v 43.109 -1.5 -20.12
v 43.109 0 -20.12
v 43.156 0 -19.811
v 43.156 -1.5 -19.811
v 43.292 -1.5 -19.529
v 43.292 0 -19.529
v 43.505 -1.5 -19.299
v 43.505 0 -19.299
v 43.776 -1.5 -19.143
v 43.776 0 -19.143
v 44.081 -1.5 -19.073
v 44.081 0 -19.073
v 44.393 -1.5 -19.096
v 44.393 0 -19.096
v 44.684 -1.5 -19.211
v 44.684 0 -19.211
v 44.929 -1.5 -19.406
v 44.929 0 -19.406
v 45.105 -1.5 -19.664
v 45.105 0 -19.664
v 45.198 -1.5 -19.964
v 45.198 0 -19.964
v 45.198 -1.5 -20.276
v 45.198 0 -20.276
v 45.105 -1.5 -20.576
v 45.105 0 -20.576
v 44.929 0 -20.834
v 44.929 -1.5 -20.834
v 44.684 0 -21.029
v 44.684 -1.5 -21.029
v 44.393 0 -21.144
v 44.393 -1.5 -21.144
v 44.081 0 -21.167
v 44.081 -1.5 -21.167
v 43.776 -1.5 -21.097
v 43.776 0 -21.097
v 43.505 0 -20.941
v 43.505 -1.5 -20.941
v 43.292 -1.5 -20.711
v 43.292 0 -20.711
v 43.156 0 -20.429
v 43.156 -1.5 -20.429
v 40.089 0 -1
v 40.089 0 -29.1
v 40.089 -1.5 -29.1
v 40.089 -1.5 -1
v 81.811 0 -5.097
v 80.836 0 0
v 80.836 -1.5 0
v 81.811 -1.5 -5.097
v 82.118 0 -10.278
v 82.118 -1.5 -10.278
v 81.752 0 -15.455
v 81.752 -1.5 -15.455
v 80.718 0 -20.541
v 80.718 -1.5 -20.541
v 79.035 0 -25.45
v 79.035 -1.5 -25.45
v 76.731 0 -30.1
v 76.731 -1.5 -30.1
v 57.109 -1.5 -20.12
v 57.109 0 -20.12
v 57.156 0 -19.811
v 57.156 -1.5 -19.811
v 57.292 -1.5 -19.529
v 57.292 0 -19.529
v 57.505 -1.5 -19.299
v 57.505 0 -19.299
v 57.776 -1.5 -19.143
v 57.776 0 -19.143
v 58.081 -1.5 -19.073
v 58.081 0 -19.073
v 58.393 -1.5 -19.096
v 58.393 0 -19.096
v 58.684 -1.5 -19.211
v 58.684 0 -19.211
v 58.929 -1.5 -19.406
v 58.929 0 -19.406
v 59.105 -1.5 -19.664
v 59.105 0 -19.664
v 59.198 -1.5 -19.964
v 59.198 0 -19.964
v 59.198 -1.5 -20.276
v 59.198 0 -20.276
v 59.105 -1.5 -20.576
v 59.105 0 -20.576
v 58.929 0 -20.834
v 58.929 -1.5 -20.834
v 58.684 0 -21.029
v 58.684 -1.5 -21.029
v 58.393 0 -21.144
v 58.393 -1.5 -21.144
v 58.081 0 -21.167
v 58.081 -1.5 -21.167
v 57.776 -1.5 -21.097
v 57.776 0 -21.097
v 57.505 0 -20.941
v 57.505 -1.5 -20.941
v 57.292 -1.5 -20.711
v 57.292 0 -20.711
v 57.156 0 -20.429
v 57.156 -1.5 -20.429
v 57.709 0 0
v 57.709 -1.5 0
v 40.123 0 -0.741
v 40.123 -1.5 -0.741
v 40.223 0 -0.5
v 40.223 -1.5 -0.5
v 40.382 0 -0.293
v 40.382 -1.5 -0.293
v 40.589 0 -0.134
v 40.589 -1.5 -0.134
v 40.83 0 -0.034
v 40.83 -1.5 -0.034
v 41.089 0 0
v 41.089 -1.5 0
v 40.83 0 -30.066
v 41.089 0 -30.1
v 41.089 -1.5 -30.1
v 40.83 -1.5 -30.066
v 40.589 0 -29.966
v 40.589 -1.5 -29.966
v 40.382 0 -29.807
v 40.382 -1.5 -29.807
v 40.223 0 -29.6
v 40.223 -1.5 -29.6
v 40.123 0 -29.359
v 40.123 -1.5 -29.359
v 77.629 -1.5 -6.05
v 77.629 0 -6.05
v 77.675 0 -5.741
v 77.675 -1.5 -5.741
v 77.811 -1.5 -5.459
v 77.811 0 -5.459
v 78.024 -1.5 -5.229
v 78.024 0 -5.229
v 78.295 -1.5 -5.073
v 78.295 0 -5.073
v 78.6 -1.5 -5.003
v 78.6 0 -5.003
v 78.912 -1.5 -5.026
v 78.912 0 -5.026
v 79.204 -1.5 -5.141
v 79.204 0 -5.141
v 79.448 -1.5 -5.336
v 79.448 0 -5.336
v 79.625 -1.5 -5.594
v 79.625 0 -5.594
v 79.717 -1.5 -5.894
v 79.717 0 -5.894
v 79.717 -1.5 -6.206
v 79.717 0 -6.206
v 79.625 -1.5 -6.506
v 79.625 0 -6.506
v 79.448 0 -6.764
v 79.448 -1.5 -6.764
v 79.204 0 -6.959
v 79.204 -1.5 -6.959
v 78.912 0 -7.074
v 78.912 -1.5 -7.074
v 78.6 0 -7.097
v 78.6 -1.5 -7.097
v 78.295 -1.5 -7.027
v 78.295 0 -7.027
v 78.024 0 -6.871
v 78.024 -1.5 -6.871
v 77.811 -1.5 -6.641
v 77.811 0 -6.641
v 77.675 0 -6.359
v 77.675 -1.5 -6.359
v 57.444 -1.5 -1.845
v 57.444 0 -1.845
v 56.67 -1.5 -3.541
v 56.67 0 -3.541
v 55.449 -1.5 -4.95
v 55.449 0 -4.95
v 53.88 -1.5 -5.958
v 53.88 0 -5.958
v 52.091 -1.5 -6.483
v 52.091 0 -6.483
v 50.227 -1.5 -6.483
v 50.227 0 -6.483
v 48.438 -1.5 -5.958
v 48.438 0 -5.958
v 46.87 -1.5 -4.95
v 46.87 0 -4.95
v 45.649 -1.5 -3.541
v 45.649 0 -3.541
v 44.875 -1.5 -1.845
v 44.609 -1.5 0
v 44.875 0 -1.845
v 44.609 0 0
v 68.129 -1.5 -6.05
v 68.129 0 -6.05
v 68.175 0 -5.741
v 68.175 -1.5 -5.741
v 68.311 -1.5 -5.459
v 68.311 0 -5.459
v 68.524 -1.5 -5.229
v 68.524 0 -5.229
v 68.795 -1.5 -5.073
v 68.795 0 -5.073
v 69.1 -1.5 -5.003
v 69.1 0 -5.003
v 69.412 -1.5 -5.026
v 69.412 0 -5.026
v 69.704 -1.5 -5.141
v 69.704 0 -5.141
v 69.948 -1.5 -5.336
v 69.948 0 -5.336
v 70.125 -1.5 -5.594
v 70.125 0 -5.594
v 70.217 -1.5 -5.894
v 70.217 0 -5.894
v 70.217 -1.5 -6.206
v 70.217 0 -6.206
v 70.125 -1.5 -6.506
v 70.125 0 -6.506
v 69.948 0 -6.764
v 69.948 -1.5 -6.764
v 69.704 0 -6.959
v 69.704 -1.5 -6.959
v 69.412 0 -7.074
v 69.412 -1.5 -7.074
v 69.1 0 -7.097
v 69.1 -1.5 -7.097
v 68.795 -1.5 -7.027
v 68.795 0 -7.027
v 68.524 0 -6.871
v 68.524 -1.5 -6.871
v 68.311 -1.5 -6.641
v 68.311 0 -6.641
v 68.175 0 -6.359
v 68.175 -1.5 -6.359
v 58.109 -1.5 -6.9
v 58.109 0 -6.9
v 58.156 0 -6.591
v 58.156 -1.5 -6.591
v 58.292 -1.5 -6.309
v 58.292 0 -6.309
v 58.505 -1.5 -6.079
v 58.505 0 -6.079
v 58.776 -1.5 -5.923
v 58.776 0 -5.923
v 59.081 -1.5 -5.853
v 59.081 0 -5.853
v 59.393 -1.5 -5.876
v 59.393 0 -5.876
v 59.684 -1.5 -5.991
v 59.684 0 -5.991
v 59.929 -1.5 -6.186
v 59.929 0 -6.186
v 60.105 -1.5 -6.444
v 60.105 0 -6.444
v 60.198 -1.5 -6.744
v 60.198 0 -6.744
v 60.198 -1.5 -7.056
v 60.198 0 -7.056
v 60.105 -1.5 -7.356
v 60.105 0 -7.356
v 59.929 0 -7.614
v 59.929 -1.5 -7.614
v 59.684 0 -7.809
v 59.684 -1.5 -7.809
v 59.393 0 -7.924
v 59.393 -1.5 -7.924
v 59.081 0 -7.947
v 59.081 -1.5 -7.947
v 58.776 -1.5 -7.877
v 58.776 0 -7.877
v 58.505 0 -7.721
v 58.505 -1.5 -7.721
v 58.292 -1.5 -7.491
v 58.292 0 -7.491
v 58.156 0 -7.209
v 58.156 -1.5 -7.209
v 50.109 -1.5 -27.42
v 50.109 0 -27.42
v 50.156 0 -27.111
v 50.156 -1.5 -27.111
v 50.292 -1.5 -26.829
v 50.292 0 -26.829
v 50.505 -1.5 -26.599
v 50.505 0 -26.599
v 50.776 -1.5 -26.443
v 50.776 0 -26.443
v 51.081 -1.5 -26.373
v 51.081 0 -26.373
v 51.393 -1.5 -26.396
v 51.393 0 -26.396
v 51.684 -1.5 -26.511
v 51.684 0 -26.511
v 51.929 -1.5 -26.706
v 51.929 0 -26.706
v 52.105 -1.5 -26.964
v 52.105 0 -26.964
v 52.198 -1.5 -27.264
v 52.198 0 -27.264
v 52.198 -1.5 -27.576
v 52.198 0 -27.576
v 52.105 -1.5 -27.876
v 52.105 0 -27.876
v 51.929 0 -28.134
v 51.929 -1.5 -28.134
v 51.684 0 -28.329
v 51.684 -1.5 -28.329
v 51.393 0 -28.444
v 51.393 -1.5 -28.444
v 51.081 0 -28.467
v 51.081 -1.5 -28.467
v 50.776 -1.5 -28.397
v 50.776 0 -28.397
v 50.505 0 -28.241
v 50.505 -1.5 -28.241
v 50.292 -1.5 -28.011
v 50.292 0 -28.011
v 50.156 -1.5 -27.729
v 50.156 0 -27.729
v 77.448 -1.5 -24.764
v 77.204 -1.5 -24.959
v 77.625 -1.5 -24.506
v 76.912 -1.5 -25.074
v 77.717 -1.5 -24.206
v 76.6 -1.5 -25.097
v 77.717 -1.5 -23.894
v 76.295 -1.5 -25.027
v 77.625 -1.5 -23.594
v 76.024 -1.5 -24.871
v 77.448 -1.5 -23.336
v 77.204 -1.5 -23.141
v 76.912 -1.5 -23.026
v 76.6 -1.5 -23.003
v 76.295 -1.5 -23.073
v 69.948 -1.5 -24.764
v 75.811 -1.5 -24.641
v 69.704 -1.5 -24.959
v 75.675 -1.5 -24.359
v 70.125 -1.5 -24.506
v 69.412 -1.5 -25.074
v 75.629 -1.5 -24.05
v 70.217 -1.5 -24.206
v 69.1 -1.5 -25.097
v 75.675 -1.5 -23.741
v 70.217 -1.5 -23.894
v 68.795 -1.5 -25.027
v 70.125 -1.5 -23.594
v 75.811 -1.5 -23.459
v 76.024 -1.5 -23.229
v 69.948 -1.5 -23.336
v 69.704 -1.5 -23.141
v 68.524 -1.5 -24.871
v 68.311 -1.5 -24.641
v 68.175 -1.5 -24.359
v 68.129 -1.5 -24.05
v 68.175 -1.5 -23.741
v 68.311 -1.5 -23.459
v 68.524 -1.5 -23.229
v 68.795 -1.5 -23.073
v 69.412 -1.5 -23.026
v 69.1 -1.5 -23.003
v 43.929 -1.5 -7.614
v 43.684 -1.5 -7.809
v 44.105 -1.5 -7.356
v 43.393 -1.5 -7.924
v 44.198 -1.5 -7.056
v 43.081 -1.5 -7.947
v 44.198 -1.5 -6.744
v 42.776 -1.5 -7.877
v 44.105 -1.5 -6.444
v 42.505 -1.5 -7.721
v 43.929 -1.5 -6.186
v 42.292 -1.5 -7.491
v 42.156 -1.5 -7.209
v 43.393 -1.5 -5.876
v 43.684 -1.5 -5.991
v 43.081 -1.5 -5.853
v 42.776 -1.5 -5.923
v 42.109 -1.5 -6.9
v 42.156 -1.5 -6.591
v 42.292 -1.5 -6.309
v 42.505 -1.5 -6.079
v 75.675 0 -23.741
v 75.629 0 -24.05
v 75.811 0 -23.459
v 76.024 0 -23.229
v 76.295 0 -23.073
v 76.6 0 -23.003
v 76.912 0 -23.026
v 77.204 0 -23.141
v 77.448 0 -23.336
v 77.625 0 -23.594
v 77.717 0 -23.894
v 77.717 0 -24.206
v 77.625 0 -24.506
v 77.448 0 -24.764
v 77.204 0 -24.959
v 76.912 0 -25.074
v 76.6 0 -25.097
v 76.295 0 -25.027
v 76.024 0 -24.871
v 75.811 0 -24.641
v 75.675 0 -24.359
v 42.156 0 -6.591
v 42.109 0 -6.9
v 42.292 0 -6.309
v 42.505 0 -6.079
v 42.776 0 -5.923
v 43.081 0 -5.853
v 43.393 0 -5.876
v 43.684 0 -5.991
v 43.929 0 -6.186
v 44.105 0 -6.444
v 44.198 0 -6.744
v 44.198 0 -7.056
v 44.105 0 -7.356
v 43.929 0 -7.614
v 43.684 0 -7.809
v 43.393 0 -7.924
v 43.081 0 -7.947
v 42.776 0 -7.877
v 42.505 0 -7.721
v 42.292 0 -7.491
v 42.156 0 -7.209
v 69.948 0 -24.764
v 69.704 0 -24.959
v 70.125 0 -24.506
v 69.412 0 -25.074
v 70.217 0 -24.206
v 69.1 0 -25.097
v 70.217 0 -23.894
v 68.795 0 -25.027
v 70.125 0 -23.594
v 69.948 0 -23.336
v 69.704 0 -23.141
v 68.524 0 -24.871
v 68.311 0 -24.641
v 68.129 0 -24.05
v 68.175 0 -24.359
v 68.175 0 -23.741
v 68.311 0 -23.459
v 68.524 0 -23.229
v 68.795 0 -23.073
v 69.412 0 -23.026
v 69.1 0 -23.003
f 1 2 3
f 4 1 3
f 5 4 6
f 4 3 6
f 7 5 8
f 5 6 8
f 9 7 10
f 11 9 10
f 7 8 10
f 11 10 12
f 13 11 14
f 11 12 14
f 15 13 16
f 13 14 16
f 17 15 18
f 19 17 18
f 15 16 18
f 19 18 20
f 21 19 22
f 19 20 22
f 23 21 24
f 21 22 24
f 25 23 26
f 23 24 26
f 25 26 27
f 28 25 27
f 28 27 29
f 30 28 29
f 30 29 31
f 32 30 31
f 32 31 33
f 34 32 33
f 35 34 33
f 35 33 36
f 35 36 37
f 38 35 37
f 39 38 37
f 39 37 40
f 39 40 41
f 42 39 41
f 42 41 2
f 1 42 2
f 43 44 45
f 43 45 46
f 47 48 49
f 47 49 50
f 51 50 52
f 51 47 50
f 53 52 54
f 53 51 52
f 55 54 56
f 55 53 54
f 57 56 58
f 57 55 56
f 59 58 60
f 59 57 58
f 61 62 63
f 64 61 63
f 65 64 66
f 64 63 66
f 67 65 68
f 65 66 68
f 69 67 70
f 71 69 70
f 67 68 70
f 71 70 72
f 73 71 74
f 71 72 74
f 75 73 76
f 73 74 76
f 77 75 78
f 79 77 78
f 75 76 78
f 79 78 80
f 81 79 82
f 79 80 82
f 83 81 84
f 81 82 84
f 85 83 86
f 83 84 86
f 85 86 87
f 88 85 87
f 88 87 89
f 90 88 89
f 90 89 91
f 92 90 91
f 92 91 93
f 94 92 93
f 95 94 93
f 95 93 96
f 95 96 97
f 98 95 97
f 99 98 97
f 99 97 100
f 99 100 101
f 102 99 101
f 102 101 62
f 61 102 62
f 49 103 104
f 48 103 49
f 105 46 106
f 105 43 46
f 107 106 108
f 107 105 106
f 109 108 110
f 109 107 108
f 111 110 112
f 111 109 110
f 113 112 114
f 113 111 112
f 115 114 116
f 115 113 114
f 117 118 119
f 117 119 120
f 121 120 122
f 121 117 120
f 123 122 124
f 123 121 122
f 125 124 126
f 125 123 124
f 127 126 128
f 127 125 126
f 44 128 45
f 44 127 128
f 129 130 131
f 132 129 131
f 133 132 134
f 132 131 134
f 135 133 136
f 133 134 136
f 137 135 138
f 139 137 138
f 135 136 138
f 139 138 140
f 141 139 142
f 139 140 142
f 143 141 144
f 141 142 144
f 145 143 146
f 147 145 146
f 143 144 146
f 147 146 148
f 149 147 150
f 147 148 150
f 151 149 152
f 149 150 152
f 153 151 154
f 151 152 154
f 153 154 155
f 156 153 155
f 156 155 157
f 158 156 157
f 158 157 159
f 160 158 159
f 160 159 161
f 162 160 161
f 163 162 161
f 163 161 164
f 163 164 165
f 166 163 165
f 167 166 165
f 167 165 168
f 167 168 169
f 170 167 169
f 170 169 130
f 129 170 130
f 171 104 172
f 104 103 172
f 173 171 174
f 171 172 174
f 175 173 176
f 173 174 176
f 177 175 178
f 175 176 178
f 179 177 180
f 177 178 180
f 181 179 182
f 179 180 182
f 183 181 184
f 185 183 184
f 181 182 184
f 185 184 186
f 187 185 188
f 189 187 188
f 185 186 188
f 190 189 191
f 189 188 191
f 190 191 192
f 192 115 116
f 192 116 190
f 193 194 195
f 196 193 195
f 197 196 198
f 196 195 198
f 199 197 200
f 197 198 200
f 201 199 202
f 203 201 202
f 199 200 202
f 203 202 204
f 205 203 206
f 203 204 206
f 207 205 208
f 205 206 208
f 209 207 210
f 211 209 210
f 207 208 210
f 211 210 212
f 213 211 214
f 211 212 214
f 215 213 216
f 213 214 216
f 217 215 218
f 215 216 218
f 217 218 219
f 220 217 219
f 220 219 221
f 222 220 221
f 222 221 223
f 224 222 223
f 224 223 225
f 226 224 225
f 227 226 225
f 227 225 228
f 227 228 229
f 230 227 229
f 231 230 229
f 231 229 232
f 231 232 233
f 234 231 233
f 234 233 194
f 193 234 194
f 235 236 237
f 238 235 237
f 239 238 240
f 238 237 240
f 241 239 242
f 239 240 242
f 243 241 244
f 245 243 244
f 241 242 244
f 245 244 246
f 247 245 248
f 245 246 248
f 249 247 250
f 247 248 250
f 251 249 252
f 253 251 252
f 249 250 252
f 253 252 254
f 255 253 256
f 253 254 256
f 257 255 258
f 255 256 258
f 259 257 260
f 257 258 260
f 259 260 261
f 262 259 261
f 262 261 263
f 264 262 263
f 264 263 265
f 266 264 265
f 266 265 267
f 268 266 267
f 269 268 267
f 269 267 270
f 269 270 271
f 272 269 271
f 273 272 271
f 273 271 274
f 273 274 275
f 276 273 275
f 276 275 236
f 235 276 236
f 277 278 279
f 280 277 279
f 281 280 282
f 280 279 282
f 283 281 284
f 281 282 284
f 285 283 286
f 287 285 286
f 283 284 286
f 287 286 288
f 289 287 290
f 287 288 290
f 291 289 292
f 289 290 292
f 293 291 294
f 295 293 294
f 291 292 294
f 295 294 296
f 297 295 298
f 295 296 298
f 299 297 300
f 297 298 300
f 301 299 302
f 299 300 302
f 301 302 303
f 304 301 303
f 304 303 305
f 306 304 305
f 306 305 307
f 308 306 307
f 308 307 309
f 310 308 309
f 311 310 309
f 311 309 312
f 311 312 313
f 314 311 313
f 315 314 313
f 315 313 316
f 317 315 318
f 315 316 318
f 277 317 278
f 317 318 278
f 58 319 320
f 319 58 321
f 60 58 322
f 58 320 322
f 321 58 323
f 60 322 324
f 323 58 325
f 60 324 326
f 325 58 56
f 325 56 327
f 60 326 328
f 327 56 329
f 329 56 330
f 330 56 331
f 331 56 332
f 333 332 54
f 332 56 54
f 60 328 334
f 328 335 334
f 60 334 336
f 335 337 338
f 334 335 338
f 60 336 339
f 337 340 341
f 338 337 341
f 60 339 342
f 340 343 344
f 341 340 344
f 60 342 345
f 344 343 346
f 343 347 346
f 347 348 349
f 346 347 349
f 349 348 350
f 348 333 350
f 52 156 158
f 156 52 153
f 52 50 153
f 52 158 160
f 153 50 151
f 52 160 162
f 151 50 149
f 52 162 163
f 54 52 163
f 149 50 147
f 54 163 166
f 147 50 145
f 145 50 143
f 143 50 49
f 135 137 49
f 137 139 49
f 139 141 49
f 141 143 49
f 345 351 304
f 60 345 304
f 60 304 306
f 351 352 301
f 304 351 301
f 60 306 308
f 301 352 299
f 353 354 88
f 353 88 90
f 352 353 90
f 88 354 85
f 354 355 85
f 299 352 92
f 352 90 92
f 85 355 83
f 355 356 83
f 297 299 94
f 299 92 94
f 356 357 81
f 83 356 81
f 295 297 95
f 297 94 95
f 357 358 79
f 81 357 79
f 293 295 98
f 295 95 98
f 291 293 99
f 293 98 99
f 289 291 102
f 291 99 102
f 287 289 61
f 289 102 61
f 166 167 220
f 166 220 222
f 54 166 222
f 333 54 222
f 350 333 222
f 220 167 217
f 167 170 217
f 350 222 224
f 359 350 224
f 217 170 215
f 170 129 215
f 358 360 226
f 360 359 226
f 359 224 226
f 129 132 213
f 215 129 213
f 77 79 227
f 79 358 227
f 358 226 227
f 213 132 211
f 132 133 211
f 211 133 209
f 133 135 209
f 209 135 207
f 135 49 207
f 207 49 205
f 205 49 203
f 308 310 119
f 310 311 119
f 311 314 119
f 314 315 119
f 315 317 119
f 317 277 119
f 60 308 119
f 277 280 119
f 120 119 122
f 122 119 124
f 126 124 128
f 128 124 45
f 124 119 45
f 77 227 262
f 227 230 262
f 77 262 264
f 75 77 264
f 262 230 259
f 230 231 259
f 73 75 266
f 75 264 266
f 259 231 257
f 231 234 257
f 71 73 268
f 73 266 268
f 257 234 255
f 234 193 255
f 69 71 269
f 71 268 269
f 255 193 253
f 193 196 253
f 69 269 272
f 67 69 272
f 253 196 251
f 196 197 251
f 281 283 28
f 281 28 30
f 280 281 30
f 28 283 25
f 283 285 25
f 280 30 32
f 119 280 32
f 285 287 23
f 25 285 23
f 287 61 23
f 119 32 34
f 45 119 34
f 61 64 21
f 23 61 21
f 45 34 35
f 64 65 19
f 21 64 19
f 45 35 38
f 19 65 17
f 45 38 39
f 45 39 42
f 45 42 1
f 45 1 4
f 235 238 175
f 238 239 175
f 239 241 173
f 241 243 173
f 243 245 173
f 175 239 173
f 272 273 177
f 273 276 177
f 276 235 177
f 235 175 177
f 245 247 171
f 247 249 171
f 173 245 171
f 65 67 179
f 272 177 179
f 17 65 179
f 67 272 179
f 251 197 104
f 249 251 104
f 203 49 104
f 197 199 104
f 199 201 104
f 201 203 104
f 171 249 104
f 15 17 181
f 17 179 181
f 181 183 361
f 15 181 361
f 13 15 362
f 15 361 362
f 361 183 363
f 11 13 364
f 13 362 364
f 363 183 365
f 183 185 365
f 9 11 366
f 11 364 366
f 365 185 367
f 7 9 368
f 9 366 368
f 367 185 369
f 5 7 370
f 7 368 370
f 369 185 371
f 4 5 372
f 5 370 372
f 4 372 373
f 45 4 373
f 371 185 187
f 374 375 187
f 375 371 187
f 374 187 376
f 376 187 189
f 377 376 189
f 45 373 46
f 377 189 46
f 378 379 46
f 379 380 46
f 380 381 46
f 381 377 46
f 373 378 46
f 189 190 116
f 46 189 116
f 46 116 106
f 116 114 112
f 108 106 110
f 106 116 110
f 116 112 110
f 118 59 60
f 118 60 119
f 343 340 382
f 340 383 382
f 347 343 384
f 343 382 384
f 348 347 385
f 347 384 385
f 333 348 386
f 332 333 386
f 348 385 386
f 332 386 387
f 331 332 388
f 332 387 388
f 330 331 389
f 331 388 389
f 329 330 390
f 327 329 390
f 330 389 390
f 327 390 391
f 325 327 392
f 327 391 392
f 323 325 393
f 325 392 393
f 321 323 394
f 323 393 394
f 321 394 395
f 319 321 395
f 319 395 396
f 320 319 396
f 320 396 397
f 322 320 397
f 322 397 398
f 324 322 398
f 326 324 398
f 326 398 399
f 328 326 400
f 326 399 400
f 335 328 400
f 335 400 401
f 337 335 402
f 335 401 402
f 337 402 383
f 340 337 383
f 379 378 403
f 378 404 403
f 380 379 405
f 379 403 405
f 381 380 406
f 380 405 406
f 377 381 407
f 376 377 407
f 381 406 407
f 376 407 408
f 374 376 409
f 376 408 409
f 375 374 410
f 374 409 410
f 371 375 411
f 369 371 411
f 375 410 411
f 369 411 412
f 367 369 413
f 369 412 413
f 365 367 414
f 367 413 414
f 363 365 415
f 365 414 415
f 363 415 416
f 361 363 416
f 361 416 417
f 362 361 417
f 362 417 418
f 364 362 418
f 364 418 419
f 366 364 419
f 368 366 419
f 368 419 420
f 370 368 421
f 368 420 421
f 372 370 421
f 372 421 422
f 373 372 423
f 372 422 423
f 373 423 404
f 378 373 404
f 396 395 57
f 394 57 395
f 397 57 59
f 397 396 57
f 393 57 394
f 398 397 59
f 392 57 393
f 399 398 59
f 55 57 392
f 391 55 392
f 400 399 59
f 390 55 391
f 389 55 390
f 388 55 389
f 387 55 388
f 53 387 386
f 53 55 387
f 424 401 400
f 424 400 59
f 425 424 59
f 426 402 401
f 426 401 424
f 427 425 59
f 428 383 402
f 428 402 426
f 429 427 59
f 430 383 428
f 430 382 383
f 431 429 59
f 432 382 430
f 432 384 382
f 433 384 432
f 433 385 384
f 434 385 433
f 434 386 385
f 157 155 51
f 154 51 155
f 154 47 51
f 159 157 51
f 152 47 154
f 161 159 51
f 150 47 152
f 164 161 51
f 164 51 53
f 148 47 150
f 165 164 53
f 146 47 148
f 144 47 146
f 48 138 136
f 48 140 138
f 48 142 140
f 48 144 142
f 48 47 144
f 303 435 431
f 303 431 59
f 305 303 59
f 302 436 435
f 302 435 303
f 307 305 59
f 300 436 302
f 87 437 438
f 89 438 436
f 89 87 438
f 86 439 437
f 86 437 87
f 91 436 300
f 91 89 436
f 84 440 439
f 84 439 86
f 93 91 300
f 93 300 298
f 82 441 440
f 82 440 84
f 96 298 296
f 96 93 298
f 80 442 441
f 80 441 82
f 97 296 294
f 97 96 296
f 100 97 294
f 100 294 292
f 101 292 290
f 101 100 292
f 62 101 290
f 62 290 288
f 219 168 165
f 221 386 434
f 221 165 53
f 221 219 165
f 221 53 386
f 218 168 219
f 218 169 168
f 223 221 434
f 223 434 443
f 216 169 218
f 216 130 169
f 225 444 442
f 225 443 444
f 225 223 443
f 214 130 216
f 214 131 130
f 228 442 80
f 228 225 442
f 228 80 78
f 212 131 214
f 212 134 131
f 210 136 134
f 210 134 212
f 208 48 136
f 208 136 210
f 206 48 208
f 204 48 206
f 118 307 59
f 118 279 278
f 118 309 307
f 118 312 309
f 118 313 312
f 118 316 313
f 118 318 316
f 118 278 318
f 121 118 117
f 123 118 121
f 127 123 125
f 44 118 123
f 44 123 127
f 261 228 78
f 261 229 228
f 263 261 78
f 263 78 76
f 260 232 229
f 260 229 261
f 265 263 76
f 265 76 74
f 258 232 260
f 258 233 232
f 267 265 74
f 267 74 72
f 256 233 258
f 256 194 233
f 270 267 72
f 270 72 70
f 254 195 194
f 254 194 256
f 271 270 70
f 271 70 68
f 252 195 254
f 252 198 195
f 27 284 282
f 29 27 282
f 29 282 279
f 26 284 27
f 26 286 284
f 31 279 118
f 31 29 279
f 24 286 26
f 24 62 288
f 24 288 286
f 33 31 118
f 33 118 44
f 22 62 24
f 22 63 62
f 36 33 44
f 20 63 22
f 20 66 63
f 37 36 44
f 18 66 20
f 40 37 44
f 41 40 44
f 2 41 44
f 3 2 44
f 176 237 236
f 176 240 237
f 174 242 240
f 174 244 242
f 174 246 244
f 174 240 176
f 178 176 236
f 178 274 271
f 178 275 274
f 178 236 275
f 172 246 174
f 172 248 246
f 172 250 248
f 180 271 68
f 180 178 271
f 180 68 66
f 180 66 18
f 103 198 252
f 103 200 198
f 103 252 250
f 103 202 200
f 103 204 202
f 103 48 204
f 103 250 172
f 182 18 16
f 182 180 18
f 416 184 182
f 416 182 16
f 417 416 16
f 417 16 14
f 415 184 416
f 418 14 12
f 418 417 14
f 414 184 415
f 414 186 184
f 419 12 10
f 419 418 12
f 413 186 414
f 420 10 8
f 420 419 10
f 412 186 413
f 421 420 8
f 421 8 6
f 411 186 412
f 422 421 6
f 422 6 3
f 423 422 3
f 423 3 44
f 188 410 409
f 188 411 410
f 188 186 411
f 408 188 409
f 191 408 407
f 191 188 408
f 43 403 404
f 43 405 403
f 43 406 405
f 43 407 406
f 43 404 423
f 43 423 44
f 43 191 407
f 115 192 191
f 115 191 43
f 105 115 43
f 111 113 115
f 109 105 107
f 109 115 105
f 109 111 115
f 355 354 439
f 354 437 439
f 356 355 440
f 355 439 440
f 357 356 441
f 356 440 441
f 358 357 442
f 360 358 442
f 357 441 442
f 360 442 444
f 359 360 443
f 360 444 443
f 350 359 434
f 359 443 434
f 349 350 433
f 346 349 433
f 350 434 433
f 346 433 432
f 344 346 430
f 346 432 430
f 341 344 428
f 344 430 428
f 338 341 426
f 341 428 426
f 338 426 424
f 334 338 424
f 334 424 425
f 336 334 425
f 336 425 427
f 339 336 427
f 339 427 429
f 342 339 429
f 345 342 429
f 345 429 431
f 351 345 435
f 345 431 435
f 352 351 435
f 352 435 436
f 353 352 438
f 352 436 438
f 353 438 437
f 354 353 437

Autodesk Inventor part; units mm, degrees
ref_plane "YZ Plane" through (0, 0, 0) normal (1, 0, 0) x (0, 1, 0)
ref_plane "XZ Plane" through (0, 0, 0) normal (0, 1, 0) x (-1, 0, 0)
ref_plane "XY Plane" through (0, 0, 0) normal (0, 0, 1) x (1, 0, 0)
sketch "Sketch1" plane through (0, 0, 0) normal (0, 1, 0) x (-1, 0, 0)
  line L0 (-63.7289, -30.1) -> (-63.7289, 0)
  circle A0 centre (-78.6786, -6.05) radius 1.05
  circle A1 centre (-76.6786, -24.05) radius 1.05
  circle A2 centre (-69.1786, -24.05) radius 1.05
  circle A3 centre (-69.1786, -6.05) radius 1.05
  circle A4 centre (-43.1593, -6.9) radius 1.05
  circle A5 centre (-44.1593, -20.12) radius 1.05
  circle A6 centre (-51.1593, -27.42) radius 1.05
  circle A7 centre (-58.1593, -20.12) radius 1.05
  circle A8 centre (-59.1593, -6.9) radius 1.05
  arc A9 (-40.0893, -1) -> (-41.0893, 0) centre (-41.0893, -1) ccw
  line L1 (-40.0893, -29.1) -> (-40.0893, -1)
  arc A10 (-41.0893, -30.1) -> (-40.0893, -29.1) centre (-41.0893, -29.1) ccw
  arc A11 (-80.8355, 0) -> (-76.7307, -30.1) centre (-42.1186, -10.05) ccw
  line L2 (-57.7093, 0) -> (-80.8355, 0)
  line L3 (-76.7307, -30.1) -> (-41.0893, -30.1)
  arc A12 (-57.7093, 0) -> (-44.6093, 0) centre (-51.1593, 0) ccw
  line L4 (-41.0893, 0) -> (-44.6093, 0)
  line L5 (-63.2793, -30.1) -> (-63.2793, 0)
  line L6 (-64.1786, 0) -> (-64.1786, -30.1)
extrude "Extrusion1" add sketch "Sketch1" against normal blind 1.5
properties part number "axis_2_bottom_L_frame(top)"
